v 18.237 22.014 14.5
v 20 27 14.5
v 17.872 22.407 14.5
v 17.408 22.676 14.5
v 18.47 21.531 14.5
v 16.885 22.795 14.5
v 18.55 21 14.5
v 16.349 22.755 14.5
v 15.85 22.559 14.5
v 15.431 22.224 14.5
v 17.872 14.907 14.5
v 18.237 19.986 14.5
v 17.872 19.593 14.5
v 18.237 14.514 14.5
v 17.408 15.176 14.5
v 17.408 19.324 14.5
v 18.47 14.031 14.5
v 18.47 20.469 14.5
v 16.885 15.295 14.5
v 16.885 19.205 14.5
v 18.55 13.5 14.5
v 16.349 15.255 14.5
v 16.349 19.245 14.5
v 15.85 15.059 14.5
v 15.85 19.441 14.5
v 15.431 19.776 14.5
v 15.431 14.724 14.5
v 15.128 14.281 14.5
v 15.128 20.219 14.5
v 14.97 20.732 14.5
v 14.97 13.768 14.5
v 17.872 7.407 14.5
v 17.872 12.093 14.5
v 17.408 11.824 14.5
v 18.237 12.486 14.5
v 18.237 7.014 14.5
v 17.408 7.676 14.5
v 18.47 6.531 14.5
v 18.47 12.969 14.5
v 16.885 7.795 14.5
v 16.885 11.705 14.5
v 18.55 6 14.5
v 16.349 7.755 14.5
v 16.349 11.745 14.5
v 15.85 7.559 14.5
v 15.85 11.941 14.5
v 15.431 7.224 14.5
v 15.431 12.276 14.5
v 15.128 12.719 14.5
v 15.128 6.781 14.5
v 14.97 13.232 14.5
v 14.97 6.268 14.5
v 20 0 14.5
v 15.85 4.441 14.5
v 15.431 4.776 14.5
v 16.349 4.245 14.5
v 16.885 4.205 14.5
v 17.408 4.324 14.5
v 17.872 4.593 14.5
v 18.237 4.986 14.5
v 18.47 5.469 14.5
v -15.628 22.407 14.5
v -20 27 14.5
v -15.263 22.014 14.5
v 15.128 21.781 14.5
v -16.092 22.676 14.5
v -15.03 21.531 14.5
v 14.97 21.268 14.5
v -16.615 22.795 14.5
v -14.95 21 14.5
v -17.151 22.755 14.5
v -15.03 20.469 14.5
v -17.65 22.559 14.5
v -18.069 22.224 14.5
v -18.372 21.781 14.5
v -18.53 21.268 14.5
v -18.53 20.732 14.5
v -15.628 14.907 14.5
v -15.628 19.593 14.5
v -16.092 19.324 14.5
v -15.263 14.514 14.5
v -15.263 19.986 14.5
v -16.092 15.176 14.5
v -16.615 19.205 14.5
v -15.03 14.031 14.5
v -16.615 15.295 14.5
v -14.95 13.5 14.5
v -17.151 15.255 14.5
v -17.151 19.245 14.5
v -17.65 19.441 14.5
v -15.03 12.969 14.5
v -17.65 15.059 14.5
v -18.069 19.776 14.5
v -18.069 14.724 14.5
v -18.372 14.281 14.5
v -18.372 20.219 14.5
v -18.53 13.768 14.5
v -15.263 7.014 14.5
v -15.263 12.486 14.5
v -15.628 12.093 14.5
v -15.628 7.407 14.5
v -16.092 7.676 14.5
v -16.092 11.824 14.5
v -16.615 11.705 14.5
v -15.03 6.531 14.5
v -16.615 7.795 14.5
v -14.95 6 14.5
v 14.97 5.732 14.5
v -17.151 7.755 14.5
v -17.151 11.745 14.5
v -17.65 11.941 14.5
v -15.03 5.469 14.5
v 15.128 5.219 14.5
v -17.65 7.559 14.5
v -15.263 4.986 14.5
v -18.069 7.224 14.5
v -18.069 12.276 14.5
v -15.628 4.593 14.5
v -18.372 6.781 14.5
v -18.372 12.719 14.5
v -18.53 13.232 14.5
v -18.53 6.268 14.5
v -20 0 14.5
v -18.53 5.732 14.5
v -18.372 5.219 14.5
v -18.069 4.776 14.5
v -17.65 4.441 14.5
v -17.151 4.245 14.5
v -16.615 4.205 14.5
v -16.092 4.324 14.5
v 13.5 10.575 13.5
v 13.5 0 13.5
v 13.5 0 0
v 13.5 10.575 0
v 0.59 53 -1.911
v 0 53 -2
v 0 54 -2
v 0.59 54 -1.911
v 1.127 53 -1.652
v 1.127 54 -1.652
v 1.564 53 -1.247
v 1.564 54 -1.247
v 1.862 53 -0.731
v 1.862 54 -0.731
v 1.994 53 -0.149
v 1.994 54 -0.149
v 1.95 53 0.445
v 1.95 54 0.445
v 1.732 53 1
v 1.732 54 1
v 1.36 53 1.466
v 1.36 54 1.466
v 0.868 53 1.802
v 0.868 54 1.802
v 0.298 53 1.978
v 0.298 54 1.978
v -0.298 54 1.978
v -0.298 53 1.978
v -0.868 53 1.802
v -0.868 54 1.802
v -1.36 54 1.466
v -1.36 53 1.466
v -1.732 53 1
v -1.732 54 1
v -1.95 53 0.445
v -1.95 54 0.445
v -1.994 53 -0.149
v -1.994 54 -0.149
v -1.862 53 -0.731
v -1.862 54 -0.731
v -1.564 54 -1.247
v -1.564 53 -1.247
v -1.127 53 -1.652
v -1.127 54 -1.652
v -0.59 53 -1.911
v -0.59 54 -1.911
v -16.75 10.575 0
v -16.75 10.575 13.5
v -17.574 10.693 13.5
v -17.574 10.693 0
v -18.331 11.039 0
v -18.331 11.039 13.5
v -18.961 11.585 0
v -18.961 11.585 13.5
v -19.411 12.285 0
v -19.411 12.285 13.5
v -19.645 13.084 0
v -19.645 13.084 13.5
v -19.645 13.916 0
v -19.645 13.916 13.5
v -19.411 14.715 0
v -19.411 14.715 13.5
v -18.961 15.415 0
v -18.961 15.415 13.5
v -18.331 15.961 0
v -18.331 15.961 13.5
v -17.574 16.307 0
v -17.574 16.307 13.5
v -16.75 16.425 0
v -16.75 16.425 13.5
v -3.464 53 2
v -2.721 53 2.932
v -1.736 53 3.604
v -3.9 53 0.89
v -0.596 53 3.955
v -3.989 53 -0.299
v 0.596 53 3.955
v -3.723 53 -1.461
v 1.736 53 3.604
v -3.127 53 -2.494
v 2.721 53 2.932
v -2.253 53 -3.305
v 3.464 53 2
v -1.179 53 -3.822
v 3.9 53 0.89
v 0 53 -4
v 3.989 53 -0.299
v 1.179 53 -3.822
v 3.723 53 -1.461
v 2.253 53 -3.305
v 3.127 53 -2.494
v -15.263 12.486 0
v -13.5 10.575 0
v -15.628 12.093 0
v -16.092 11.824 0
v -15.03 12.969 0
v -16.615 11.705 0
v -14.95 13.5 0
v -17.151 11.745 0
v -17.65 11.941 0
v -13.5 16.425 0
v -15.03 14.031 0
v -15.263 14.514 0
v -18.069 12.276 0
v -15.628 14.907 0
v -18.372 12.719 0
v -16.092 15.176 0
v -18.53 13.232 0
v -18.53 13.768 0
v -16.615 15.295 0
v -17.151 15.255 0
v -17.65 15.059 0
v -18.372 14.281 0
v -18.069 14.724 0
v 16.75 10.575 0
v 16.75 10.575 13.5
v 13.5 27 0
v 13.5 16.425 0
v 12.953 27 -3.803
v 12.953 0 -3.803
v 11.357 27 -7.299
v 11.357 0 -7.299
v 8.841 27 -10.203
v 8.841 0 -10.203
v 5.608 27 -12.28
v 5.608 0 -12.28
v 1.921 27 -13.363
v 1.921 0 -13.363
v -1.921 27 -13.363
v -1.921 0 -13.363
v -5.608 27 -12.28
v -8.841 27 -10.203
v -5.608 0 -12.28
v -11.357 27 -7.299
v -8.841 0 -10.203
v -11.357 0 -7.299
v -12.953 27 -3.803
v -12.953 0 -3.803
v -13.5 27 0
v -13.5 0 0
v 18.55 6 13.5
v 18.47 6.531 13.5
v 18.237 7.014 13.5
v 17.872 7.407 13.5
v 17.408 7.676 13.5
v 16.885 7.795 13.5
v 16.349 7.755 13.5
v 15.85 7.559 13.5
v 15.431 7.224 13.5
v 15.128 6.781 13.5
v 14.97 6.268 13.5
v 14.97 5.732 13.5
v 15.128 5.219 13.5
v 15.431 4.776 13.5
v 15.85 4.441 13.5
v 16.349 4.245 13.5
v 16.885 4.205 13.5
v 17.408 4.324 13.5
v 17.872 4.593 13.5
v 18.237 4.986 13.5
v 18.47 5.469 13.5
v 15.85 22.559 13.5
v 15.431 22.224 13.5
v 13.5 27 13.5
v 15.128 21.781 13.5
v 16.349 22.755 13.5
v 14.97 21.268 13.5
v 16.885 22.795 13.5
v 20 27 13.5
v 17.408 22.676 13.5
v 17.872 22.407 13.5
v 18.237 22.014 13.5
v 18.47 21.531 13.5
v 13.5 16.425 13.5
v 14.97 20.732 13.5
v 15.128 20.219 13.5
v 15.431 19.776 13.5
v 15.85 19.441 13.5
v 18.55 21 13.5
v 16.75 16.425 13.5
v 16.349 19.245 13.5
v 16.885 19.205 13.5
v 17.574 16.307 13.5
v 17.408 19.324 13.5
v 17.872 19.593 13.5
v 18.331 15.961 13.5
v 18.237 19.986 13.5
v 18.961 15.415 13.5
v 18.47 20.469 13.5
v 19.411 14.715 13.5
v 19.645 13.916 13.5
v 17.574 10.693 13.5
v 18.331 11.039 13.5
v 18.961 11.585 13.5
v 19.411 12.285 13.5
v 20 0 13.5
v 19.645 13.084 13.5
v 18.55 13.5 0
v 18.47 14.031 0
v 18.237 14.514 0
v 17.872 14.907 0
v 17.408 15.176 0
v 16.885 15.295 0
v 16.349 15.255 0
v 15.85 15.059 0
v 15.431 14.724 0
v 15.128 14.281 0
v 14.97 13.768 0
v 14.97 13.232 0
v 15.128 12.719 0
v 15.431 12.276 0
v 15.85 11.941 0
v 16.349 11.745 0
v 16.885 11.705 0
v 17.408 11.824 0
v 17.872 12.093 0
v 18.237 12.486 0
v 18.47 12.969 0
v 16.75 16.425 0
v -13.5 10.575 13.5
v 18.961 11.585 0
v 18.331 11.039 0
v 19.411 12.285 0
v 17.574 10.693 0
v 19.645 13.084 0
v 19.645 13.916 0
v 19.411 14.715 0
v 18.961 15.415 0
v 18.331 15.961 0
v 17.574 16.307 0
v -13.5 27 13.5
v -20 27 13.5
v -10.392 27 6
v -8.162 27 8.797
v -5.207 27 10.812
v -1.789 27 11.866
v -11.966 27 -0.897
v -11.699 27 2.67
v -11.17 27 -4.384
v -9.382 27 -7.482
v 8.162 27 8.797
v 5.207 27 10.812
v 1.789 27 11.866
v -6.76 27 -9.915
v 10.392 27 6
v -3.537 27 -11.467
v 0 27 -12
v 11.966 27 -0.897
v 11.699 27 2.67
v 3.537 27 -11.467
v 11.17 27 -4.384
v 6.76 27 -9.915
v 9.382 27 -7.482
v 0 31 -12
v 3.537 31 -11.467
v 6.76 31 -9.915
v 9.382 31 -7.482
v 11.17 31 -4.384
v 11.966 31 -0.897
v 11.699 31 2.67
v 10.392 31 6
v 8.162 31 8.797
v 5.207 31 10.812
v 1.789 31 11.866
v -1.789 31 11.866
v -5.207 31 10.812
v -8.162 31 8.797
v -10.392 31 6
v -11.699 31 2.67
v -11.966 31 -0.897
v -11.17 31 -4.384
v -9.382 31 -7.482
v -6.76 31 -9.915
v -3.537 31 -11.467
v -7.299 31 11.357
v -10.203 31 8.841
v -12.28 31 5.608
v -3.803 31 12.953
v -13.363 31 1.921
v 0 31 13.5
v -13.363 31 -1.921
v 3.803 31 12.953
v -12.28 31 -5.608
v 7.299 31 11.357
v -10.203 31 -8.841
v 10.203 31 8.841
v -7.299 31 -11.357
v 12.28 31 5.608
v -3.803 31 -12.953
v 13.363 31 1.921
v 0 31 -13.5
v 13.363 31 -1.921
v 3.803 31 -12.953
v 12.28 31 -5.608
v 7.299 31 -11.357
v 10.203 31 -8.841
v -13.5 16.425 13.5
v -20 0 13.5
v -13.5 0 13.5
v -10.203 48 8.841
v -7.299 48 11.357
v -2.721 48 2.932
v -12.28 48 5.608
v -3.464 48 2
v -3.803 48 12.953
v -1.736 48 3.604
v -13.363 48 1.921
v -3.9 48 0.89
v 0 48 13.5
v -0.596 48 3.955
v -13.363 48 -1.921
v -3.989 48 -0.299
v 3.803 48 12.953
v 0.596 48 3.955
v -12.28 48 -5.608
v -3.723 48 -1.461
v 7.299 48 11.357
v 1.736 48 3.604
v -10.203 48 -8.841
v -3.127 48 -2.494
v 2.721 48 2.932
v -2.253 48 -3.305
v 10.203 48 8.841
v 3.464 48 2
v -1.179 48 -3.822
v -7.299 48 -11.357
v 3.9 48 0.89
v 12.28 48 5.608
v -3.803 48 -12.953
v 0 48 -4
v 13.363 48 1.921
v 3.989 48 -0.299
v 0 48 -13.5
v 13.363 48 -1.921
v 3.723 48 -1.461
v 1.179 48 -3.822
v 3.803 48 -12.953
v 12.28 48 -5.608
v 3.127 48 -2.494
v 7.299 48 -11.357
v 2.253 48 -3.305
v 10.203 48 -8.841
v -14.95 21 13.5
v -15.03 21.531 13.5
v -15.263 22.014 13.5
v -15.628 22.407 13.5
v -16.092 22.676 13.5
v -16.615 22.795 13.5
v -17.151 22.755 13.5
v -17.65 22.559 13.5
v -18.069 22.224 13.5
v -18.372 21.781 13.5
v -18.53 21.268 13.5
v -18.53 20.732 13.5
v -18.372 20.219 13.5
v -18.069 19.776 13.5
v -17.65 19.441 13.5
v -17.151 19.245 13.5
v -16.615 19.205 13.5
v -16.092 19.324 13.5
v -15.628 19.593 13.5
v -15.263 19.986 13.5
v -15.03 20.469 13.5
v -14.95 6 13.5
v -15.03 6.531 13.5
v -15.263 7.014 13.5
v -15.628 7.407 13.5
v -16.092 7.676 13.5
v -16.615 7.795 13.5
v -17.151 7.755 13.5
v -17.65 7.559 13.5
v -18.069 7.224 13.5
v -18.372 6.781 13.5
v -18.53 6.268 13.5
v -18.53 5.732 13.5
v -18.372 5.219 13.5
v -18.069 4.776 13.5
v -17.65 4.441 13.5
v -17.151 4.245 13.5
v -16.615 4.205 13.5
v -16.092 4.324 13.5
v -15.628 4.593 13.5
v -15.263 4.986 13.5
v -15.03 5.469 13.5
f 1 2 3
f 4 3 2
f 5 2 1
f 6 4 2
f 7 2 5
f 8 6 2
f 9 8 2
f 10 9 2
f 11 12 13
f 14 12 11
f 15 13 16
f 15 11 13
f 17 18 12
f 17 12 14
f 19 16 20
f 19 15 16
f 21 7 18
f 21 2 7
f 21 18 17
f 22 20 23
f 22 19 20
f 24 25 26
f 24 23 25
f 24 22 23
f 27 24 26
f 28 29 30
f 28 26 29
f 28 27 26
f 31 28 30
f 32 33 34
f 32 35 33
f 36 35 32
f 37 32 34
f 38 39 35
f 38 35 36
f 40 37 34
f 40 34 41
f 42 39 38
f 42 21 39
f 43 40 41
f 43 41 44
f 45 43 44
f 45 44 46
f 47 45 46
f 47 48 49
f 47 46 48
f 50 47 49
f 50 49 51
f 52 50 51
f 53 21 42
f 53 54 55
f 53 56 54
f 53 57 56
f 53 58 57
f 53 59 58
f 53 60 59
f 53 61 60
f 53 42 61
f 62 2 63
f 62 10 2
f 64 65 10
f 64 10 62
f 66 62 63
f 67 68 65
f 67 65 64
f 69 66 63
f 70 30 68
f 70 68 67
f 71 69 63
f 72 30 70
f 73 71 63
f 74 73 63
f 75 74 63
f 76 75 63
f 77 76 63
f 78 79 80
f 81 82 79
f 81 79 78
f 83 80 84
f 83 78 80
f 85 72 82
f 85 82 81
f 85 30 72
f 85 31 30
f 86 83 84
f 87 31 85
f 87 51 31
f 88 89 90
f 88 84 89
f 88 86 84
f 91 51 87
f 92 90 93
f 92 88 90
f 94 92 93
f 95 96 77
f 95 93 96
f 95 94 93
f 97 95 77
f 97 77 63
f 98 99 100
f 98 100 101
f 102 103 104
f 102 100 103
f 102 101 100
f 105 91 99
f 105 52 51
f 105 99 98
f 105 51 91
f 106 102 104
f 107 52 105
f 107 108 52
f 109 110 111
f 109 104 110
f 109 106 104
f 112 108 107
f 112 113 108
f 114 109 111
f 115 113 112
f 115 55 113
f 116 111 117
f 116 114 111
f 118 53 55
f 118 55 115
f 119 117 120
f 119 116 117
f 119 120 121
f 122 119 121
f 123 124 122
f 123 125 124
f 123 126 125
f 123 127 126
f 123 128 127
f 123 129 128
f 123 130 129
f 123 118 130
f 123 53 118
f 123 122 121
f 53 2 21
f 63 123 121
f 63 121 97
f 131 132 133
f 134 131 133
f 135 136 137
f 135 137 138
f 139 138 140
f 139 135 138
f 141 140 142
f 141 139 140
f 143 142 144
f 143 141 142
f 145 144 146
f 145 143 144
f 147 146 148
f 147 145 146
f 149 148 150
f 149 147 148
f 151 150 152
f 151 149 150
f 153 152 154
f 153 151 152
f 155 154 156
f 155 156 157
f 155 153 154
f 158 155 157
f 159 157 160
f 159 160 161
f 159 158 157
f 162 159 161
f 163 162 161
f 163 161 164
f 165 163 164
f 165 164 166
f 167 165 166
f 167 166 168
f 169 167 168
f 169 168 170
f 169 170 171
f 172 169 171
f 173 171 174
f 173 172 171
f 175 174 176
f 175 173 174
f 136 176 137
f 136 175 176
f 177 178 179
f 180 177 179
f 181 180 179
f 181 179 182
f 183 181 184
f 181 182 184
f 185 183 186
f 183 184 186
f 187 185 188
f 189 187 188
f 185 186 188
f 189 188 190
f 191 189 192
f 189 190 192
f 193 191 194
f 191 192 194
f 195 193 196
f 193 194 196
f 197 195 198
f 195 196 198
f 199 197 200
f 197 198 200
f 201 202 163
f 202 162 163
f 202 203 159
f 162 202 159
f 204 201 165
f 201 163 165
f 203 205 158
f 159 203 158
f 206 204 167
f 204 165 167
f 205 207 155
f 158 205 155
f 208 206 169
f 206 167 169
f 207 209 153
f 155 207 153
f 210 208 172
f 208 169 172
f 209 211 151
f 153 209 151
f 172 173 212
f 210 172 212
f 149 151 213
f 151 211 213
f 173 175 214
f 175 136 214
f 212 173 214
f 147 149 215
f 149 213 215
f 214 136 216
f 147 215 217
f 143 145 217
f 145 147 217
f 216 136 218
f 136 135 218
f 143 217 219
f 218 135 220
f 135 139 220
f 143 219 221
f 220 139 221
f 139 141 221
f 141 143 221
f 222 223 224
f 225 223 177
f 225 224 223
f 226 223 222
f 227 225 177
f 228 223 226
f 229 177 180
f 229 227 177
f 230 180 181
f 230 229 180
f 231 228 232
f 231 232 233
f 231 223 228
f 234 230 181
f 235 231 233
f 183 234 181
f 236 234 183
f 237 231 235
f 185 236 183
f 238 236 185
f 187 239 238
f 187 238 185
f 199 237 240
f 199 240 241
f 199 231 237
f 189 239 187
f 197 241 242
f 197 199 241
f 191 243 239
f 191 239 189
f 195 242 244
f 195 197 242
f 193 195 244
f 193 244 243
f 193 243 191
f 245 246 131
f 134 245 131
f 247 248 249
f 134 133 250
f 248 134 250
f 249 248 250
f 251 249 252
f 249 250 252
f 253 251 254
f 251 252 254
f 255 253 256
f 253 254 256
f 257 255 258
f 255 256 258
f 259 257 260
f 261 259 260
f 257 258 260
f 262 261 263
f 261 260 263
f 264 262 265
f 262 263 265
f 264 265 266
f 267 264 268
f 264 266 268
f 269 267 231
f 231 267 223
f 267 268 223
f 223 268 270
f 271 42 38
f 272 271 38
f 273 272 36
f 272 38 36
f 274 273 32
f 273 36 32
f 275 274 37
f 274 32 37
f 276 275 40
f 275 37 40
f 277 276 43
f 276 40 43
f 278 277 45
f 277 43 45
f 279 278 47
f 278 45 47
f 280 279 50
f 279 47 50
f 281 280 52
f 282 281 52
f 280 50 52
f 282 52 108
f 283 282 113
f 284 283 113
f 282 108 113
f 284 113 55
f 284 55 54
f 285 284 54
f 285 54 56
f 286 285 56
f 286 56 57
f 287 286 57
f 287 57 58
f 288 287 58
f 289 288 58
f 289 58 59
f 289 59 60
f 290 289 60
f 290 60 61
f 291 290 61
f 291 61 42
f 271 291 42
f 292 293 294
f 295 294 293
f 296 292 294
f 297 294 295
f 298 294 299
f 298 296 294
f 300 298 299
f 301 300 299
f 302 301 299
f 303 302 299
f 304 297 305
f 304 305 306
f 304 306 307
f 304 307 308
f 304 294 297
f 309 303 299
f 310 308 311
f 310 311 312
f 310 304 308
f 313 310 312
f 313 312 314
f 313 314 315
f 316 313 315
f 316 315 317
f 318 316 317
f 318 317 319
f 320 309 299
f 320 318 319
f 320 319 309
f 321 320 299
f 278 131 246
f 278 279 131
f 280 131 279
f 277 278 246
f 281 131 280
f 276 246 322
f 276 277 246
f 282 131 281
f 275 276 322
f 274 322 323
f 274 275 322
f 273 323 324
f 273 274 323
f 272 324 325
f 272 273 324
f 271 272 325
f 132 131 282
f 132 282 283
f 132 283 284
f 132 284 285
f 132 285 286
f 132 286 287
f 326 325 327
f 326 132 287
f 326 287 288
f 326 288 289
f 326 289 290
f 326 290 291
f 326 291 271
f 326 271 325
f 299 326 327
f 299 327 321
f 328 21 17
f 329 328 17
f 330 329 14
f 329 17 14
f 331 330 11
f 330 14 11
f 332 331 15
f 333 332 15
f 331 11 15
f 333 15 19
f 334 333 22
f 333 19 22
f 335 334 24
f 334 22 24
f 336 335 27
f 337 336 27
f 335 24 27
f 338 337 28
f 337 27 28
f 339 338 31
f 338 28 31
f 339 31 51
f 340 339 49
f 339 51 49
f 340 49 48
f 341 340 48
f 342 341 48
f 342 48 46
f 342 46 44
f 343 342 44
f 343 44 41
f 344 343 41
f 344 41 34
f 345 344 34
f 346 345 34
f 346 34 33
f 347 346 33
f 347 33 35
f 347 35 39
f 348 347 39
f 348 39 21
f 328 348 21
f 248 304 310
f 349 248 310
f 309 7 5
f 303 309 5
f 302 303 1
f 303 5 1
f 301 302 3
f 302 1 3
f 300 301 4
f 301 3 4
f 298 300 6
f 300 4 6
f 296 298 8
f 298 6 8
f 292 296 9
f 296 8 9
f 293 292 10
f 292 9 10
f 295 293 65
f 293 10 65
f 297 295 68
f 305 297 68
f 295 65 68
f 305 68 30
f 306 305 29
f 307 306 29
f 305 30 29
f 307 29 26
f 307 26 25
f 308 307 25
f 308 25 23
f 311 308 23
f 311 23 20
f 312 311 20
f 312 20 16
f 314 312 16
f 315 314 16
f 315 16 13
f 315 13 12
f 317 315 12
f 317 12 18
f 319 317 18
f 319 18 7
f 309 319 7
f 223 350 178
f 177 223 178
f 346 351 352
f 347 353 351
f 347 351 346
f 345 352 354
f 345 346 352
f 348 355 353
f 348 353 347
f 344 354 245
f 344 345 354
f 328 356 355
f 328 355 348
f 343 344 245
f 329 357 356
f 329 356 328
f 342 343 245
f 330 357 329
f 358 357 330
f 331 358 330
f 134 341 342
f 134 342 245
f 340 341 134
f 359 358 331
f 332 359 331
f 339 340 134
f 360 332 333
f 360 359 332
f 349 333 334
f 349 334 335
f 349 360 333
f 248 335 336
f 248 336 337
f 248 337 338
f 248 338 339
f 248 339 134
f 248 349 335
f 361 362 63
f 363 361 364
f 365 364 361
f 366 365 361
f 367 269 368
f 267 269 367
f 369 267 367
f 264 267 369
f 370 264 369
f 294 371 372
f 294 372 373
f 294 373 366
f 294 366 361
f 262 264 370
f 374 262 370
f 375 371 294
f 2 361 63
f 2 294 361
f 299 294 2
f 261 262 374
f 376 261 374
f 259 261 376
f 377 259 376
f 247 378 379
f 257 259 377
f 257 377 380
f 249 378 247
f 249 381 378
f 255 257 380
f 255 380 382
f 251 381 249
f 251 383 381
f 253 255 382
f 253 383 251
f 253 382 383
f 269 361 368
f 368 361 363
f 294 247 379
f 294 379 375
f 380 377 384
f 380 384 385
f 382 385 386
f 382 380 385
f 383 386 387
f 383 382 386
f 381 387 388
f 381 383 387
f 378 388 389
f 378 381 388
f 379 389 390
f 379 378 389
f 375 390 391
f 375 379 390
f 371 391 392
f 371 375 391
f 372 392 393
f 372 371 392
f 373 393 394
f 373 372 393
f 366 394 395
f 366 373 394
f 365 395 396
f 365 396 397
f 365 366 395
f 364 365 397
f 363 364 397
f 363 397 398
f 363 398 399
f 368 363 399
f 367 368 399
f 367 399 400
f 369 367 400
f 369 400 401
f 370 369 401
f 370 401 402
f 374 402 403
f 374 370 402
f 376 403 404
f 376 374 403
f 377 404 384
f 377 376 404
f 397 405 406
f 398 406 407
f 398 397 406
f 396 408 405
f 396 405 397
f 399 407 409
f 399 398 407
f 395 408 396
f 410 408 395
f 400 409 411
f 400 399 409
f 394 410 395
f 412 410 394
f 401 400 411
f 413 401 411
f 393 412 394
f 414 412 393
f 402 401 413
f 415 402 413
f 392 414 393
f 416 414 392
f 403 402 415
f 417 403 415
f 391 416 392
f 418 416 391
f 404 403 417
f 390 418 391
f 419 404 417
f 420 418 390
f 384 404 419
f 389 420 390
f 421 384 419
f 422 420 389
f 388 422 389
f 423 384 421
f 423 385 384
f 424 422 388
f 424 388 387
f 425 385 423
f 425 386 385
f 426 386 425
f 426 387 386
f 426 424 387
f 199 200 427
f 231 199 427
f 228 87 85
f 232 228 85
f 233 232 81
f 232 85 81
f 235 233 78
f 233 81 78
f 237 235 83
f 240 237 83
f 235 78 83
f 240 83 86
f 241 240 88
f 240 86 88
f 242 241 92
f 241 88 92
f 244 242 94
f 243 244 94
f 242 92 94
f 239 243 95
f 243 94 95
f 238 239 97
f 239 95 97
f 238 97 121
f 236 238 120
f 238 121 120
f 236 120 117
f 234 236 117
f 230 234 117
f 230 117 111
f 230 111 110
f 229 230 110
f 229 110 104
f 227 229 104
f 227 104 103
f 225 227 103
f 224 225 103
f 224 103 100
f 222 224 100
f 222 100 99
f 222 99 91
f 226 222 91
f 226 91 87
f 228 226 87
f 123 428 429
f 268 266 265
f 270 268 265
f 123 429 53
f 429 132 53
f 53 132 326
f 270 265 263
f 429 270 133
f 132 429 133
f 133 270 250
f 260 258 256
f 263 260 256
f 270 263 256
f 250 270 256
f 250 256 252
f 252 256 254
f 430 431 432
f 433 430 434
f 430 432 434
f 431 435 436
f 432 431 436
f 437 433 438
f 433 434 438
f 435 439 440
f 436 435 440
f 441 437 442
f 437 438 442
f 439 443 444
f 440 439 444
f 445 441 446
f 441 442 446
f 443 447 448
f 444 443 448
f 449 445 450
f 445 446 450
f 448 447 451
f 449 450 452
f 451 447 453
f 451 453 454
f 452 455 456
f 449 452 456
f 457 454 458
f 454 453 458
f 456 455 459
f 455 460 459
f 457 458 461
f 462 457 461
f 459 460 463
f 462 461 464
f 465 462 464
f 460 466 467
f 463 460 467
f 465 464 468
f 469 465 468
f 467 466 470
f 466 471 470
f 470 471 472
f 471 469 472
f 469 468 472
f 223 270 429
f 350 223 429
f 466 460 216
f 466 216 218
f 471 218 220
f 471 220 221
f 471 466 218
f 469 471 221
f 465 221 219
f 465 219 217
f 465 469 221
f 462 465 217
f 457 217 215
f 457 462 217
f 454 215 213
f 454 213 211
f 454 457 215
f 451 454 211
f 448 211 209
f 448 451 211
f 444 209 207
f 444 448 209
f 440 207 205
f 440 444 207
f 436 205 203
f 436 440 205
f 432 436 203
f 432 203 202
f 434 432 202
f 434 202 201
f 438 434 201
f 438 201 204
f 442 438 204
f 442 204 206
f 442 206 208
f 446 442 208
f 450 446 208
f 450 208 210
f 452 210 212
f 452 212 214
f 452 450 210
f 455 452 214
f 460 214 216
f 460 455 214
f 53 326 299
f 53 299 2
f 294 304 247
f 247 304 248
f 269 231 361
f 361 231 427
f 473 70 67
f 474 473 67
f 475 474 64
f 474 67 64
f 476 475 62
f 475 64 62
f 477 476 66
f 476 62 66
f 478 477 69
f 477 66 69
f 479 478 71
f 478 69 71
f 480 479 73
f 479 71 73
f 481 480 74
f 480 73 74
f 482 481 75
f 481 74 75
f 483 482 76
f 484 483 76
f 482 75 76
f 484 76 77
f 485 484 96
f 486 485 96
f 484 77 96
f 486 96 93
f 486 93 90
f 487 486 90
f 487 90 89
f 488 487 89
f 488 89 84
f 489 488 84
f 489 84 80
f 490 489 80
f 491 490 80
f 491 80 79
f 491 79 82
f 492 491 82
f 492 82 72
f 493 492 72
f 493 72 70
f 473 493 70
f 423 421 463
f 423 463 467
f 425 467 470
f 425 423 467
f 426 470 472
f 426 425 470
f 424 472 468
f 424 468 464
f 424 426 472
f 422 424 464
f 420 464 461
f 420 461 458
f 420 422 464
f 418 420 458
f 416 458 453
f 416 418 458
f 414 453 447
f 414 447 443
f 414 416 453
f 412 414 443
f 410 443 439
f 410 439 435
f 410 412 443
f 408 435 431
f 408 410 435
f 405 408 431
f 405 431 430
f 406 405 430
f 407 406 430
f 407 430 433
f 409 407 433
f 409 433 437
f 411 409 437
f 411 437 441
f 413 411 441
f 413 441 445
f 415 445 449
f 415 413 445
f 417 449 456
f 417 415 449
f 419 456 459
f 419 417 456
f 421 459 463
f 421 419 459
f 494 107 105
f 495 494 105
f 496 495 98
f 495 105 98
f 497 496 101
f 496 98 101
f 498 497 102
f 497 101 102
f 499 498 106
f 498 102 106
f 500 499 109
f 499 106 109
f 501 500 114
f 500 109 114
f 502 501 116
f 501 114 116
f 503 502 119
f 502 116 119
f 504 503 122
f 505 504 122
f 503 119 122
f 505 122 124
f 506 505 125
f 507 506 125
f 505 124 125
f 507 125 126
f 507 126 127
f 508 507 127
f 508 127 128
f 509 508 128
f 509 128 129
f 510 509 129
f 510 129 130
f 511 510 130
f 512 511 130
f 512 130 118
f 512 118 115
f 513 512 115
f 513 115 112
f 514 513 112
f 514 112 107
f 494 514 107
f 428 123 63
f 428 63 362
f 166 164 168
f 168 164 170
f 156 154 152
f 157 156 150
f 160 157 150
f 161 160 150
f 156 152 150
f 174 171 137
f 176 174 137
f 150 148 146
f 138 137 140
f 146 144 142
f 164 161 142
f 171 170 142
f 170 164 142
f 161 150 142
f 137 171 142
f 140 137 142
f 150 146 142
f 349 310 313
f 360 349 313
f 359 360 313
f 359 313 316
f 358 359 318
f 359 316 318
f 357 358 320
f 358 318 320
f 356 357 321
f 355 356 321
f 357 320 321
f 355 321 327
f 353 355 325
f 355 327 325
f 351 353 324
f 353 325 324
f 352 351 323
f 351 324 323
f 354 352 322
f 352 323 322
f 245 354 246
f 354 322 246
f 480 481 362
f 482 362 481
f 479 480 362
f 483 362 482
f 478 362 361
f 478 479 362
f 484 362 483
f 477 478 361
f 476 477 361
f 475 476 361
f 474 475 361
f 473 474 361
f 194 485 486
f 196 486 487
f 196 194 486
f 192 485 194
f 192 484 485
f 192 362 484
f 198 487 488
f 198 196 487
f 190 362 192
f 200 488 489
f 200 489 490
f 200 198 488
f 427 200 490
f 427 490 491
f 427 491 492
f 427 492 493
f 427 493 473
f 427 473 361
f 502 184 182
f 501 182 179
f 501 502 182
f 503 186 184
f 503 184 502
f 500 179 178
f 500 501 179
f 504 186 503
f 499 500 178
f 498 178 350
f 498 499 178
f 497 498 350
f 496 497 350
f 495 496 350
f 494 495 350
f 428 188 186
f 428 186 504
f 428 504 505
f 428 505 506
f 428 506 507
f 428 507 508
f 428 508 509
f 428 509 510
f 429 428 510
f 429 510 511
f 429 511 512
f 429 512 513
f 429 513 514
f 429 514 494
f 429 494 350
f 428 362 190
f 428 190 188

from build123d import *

# Parameters (mm, degrees)
SKETCH_1_R                   = 13.5
EXTRUDE_7_DEPTH              = 27
EXTRUDE_9_DEPTH              = 13.5
EXTRUDE_10_DEPTH             = 13.5
EXTRUDE_START                = -27
SKETCH_9_R                   = 12
EXTRUDE_11_DEPTH             = 4
EXTRUDE_START_2              = -31
SKETCH_10_R                  = 13.5
EXTRUDE_12_DEPTH             = 17
EXTRUDE_START_3              = -48
SKETCH_11_R                  = 4
EXTRUDE_13_DEPTH             = 5
EXTRUDE_START_4              = -53
SKETCH_12_R                  = 2
EXTRUDE_14_DEPTH             = 1
HOLE_WIZARD_M3_1_D           = 3.6
HOLE_WIZARD_M3_1_ON_FACE_2_D = 3.6


with BuildPart() as part:
    # ｽｹｯﾁ1 → ﾎﾞｽ - 押し出し7 (new body)
    with BuildSketch(Plane(origin=(0, 0, 0), x_dir=(1, 0, 0), z_dir=(0, 1, 0))):
        Circle(SKETCH_1_R)
        with BuildLine():
            Line((-13.5, -13.5), (0, -13.5))
            ThreePointArc((0, -13.5), (-9.545941546, -9.545941546), (-13.5, 0))
            Line((-13.5, 0), (-13.5, -13.5))
        make_face()
        with BuildLine():
            ThreePointArc((13.5, 0), (9.545941546, -9.545941546), (0, -13.5))
            Line((0, -13.5), (13.5, -13.5))
            Line((13.5, -13.5), (13.5, 0))
        make_face()
        Polygon((20, -13.5), (20, -14.5), (-20, -14.5), (-20, -13.5), (0, -13.5), align=None)
    extrude(amount=EXTRUDE_7_DEPTH)

    # ｽｹｯﾁ2 → ﾎﾞｽ - 押し出し9 (add)
    with BuildSketch(Plane(origin=(0, 0, 13.5), x_dir=(-1, 0, 0), z_dir=(0, 0, -1))):
        with BuildLine():
            Line((13.5, 10.575), (16.75, 10.575))
            ThreePointArc((16.75, 10.575), (19.675, 13.5), (16.75, 16.425))
            Line((16.75, 16.425), (13.5, 16.425))
            Line((13.5, 16.425), (13.5, 10.575))
        make_face()
    extrude(amount=EXTRUDE_9_DEPTH)

    # ｽｹｯﾁ3 → ﾎﾞｽ - 押し出し10 (add)
    with BuildSketch(Plane(origin=(0, 0, 13.5), x_dir=(-1, 0, 0), z_dir=(0, 0, -1))):
        with BuildLine():
            Line((-13.5, 16.425), (-16.75, 16.425))
            ThreePointArc((-16.75, 16.425), (-19.675, 13.5), (-16.75, 10.575))
            Line((-16.75, 10.575), (-13.5, 10.575))
            Line((-13.5, 10.575), (-13.5, 16.425))
        make_face()
    extrude(amount=EXTRUDE_10_DEPTH)

    # ｽｹｯﾁ9 → ﾎﾞｽ - 押し出し11 (add)
    with BuildSketch(Plane.XZ.offset(EXTRUDE_START)):
        with Locations(Location((0, 0, 0), (0, 0, 270))):
            Circle(SKETCH_9_R)
    extrude(amount=-EXTRUDE_11_DEPTH)

    # ｽｹｯﾁ10 → ﾎﾞｽ - 押し出し12 (add)
    with BuildSketch(Plane.XZ.offset(EXTRUDE_START_2)):
        with Locations(Location((0, 0, 0), (0, 0, 270))):
            Circle(SKETCH_10_R)
    extrude(amount=-EXTRUDE_12_DEPTH)

    # ｽｹｯﾁ11 → ﾎﾞｽ - 押し出し13 (add)
    with BuildSketch(Plane.XZ.offset(EXTRUDE_START_3)):
        with Locations(Location((0, 0, 0), (0, 0, 270))):
            Circle(SKETCH_11_R)
    extrude(amount=-EXTRUDE_13_DEPTH)

    # ｽｹｯﾁ12 → ﾎﾞｽ - 押し出し14 (add)
    with BuildSketch(Plane.XZ.offset(EXTRUDE_START_4)):
        with Locations(Location((0, 0, 0), (0, 0, 270))):
            Circle(SKETCH_12_R)
    extrude(amount=-EXTRUDE_14_DEPTH)

    # M3 すきま穴1 (through all)
    with Locations(Plane(origin=(16.75, 21, 13.5), x_dir=(-1, 0, 0), z_dir=(0, 0, -1))):
        with Locations((0, 0), (0, -15), (33.5, 0), (33.5, -15)):
            Hole(HOLE_WIZARD_M3_1_D / 2)

    # M3 すきま穴1 on face 2 (through all)
    with Locations(Plane(origin=(16.75, 13.5, 0), x_dir=(-1, 0, 0), z_dir=(0, 0, -1))):
        with Locations((0, 0), (33.5, 0)):
            Hole(HOLE_WIZARD_M3_1_ON_FACE_2_D / 2)


solid = part.part
